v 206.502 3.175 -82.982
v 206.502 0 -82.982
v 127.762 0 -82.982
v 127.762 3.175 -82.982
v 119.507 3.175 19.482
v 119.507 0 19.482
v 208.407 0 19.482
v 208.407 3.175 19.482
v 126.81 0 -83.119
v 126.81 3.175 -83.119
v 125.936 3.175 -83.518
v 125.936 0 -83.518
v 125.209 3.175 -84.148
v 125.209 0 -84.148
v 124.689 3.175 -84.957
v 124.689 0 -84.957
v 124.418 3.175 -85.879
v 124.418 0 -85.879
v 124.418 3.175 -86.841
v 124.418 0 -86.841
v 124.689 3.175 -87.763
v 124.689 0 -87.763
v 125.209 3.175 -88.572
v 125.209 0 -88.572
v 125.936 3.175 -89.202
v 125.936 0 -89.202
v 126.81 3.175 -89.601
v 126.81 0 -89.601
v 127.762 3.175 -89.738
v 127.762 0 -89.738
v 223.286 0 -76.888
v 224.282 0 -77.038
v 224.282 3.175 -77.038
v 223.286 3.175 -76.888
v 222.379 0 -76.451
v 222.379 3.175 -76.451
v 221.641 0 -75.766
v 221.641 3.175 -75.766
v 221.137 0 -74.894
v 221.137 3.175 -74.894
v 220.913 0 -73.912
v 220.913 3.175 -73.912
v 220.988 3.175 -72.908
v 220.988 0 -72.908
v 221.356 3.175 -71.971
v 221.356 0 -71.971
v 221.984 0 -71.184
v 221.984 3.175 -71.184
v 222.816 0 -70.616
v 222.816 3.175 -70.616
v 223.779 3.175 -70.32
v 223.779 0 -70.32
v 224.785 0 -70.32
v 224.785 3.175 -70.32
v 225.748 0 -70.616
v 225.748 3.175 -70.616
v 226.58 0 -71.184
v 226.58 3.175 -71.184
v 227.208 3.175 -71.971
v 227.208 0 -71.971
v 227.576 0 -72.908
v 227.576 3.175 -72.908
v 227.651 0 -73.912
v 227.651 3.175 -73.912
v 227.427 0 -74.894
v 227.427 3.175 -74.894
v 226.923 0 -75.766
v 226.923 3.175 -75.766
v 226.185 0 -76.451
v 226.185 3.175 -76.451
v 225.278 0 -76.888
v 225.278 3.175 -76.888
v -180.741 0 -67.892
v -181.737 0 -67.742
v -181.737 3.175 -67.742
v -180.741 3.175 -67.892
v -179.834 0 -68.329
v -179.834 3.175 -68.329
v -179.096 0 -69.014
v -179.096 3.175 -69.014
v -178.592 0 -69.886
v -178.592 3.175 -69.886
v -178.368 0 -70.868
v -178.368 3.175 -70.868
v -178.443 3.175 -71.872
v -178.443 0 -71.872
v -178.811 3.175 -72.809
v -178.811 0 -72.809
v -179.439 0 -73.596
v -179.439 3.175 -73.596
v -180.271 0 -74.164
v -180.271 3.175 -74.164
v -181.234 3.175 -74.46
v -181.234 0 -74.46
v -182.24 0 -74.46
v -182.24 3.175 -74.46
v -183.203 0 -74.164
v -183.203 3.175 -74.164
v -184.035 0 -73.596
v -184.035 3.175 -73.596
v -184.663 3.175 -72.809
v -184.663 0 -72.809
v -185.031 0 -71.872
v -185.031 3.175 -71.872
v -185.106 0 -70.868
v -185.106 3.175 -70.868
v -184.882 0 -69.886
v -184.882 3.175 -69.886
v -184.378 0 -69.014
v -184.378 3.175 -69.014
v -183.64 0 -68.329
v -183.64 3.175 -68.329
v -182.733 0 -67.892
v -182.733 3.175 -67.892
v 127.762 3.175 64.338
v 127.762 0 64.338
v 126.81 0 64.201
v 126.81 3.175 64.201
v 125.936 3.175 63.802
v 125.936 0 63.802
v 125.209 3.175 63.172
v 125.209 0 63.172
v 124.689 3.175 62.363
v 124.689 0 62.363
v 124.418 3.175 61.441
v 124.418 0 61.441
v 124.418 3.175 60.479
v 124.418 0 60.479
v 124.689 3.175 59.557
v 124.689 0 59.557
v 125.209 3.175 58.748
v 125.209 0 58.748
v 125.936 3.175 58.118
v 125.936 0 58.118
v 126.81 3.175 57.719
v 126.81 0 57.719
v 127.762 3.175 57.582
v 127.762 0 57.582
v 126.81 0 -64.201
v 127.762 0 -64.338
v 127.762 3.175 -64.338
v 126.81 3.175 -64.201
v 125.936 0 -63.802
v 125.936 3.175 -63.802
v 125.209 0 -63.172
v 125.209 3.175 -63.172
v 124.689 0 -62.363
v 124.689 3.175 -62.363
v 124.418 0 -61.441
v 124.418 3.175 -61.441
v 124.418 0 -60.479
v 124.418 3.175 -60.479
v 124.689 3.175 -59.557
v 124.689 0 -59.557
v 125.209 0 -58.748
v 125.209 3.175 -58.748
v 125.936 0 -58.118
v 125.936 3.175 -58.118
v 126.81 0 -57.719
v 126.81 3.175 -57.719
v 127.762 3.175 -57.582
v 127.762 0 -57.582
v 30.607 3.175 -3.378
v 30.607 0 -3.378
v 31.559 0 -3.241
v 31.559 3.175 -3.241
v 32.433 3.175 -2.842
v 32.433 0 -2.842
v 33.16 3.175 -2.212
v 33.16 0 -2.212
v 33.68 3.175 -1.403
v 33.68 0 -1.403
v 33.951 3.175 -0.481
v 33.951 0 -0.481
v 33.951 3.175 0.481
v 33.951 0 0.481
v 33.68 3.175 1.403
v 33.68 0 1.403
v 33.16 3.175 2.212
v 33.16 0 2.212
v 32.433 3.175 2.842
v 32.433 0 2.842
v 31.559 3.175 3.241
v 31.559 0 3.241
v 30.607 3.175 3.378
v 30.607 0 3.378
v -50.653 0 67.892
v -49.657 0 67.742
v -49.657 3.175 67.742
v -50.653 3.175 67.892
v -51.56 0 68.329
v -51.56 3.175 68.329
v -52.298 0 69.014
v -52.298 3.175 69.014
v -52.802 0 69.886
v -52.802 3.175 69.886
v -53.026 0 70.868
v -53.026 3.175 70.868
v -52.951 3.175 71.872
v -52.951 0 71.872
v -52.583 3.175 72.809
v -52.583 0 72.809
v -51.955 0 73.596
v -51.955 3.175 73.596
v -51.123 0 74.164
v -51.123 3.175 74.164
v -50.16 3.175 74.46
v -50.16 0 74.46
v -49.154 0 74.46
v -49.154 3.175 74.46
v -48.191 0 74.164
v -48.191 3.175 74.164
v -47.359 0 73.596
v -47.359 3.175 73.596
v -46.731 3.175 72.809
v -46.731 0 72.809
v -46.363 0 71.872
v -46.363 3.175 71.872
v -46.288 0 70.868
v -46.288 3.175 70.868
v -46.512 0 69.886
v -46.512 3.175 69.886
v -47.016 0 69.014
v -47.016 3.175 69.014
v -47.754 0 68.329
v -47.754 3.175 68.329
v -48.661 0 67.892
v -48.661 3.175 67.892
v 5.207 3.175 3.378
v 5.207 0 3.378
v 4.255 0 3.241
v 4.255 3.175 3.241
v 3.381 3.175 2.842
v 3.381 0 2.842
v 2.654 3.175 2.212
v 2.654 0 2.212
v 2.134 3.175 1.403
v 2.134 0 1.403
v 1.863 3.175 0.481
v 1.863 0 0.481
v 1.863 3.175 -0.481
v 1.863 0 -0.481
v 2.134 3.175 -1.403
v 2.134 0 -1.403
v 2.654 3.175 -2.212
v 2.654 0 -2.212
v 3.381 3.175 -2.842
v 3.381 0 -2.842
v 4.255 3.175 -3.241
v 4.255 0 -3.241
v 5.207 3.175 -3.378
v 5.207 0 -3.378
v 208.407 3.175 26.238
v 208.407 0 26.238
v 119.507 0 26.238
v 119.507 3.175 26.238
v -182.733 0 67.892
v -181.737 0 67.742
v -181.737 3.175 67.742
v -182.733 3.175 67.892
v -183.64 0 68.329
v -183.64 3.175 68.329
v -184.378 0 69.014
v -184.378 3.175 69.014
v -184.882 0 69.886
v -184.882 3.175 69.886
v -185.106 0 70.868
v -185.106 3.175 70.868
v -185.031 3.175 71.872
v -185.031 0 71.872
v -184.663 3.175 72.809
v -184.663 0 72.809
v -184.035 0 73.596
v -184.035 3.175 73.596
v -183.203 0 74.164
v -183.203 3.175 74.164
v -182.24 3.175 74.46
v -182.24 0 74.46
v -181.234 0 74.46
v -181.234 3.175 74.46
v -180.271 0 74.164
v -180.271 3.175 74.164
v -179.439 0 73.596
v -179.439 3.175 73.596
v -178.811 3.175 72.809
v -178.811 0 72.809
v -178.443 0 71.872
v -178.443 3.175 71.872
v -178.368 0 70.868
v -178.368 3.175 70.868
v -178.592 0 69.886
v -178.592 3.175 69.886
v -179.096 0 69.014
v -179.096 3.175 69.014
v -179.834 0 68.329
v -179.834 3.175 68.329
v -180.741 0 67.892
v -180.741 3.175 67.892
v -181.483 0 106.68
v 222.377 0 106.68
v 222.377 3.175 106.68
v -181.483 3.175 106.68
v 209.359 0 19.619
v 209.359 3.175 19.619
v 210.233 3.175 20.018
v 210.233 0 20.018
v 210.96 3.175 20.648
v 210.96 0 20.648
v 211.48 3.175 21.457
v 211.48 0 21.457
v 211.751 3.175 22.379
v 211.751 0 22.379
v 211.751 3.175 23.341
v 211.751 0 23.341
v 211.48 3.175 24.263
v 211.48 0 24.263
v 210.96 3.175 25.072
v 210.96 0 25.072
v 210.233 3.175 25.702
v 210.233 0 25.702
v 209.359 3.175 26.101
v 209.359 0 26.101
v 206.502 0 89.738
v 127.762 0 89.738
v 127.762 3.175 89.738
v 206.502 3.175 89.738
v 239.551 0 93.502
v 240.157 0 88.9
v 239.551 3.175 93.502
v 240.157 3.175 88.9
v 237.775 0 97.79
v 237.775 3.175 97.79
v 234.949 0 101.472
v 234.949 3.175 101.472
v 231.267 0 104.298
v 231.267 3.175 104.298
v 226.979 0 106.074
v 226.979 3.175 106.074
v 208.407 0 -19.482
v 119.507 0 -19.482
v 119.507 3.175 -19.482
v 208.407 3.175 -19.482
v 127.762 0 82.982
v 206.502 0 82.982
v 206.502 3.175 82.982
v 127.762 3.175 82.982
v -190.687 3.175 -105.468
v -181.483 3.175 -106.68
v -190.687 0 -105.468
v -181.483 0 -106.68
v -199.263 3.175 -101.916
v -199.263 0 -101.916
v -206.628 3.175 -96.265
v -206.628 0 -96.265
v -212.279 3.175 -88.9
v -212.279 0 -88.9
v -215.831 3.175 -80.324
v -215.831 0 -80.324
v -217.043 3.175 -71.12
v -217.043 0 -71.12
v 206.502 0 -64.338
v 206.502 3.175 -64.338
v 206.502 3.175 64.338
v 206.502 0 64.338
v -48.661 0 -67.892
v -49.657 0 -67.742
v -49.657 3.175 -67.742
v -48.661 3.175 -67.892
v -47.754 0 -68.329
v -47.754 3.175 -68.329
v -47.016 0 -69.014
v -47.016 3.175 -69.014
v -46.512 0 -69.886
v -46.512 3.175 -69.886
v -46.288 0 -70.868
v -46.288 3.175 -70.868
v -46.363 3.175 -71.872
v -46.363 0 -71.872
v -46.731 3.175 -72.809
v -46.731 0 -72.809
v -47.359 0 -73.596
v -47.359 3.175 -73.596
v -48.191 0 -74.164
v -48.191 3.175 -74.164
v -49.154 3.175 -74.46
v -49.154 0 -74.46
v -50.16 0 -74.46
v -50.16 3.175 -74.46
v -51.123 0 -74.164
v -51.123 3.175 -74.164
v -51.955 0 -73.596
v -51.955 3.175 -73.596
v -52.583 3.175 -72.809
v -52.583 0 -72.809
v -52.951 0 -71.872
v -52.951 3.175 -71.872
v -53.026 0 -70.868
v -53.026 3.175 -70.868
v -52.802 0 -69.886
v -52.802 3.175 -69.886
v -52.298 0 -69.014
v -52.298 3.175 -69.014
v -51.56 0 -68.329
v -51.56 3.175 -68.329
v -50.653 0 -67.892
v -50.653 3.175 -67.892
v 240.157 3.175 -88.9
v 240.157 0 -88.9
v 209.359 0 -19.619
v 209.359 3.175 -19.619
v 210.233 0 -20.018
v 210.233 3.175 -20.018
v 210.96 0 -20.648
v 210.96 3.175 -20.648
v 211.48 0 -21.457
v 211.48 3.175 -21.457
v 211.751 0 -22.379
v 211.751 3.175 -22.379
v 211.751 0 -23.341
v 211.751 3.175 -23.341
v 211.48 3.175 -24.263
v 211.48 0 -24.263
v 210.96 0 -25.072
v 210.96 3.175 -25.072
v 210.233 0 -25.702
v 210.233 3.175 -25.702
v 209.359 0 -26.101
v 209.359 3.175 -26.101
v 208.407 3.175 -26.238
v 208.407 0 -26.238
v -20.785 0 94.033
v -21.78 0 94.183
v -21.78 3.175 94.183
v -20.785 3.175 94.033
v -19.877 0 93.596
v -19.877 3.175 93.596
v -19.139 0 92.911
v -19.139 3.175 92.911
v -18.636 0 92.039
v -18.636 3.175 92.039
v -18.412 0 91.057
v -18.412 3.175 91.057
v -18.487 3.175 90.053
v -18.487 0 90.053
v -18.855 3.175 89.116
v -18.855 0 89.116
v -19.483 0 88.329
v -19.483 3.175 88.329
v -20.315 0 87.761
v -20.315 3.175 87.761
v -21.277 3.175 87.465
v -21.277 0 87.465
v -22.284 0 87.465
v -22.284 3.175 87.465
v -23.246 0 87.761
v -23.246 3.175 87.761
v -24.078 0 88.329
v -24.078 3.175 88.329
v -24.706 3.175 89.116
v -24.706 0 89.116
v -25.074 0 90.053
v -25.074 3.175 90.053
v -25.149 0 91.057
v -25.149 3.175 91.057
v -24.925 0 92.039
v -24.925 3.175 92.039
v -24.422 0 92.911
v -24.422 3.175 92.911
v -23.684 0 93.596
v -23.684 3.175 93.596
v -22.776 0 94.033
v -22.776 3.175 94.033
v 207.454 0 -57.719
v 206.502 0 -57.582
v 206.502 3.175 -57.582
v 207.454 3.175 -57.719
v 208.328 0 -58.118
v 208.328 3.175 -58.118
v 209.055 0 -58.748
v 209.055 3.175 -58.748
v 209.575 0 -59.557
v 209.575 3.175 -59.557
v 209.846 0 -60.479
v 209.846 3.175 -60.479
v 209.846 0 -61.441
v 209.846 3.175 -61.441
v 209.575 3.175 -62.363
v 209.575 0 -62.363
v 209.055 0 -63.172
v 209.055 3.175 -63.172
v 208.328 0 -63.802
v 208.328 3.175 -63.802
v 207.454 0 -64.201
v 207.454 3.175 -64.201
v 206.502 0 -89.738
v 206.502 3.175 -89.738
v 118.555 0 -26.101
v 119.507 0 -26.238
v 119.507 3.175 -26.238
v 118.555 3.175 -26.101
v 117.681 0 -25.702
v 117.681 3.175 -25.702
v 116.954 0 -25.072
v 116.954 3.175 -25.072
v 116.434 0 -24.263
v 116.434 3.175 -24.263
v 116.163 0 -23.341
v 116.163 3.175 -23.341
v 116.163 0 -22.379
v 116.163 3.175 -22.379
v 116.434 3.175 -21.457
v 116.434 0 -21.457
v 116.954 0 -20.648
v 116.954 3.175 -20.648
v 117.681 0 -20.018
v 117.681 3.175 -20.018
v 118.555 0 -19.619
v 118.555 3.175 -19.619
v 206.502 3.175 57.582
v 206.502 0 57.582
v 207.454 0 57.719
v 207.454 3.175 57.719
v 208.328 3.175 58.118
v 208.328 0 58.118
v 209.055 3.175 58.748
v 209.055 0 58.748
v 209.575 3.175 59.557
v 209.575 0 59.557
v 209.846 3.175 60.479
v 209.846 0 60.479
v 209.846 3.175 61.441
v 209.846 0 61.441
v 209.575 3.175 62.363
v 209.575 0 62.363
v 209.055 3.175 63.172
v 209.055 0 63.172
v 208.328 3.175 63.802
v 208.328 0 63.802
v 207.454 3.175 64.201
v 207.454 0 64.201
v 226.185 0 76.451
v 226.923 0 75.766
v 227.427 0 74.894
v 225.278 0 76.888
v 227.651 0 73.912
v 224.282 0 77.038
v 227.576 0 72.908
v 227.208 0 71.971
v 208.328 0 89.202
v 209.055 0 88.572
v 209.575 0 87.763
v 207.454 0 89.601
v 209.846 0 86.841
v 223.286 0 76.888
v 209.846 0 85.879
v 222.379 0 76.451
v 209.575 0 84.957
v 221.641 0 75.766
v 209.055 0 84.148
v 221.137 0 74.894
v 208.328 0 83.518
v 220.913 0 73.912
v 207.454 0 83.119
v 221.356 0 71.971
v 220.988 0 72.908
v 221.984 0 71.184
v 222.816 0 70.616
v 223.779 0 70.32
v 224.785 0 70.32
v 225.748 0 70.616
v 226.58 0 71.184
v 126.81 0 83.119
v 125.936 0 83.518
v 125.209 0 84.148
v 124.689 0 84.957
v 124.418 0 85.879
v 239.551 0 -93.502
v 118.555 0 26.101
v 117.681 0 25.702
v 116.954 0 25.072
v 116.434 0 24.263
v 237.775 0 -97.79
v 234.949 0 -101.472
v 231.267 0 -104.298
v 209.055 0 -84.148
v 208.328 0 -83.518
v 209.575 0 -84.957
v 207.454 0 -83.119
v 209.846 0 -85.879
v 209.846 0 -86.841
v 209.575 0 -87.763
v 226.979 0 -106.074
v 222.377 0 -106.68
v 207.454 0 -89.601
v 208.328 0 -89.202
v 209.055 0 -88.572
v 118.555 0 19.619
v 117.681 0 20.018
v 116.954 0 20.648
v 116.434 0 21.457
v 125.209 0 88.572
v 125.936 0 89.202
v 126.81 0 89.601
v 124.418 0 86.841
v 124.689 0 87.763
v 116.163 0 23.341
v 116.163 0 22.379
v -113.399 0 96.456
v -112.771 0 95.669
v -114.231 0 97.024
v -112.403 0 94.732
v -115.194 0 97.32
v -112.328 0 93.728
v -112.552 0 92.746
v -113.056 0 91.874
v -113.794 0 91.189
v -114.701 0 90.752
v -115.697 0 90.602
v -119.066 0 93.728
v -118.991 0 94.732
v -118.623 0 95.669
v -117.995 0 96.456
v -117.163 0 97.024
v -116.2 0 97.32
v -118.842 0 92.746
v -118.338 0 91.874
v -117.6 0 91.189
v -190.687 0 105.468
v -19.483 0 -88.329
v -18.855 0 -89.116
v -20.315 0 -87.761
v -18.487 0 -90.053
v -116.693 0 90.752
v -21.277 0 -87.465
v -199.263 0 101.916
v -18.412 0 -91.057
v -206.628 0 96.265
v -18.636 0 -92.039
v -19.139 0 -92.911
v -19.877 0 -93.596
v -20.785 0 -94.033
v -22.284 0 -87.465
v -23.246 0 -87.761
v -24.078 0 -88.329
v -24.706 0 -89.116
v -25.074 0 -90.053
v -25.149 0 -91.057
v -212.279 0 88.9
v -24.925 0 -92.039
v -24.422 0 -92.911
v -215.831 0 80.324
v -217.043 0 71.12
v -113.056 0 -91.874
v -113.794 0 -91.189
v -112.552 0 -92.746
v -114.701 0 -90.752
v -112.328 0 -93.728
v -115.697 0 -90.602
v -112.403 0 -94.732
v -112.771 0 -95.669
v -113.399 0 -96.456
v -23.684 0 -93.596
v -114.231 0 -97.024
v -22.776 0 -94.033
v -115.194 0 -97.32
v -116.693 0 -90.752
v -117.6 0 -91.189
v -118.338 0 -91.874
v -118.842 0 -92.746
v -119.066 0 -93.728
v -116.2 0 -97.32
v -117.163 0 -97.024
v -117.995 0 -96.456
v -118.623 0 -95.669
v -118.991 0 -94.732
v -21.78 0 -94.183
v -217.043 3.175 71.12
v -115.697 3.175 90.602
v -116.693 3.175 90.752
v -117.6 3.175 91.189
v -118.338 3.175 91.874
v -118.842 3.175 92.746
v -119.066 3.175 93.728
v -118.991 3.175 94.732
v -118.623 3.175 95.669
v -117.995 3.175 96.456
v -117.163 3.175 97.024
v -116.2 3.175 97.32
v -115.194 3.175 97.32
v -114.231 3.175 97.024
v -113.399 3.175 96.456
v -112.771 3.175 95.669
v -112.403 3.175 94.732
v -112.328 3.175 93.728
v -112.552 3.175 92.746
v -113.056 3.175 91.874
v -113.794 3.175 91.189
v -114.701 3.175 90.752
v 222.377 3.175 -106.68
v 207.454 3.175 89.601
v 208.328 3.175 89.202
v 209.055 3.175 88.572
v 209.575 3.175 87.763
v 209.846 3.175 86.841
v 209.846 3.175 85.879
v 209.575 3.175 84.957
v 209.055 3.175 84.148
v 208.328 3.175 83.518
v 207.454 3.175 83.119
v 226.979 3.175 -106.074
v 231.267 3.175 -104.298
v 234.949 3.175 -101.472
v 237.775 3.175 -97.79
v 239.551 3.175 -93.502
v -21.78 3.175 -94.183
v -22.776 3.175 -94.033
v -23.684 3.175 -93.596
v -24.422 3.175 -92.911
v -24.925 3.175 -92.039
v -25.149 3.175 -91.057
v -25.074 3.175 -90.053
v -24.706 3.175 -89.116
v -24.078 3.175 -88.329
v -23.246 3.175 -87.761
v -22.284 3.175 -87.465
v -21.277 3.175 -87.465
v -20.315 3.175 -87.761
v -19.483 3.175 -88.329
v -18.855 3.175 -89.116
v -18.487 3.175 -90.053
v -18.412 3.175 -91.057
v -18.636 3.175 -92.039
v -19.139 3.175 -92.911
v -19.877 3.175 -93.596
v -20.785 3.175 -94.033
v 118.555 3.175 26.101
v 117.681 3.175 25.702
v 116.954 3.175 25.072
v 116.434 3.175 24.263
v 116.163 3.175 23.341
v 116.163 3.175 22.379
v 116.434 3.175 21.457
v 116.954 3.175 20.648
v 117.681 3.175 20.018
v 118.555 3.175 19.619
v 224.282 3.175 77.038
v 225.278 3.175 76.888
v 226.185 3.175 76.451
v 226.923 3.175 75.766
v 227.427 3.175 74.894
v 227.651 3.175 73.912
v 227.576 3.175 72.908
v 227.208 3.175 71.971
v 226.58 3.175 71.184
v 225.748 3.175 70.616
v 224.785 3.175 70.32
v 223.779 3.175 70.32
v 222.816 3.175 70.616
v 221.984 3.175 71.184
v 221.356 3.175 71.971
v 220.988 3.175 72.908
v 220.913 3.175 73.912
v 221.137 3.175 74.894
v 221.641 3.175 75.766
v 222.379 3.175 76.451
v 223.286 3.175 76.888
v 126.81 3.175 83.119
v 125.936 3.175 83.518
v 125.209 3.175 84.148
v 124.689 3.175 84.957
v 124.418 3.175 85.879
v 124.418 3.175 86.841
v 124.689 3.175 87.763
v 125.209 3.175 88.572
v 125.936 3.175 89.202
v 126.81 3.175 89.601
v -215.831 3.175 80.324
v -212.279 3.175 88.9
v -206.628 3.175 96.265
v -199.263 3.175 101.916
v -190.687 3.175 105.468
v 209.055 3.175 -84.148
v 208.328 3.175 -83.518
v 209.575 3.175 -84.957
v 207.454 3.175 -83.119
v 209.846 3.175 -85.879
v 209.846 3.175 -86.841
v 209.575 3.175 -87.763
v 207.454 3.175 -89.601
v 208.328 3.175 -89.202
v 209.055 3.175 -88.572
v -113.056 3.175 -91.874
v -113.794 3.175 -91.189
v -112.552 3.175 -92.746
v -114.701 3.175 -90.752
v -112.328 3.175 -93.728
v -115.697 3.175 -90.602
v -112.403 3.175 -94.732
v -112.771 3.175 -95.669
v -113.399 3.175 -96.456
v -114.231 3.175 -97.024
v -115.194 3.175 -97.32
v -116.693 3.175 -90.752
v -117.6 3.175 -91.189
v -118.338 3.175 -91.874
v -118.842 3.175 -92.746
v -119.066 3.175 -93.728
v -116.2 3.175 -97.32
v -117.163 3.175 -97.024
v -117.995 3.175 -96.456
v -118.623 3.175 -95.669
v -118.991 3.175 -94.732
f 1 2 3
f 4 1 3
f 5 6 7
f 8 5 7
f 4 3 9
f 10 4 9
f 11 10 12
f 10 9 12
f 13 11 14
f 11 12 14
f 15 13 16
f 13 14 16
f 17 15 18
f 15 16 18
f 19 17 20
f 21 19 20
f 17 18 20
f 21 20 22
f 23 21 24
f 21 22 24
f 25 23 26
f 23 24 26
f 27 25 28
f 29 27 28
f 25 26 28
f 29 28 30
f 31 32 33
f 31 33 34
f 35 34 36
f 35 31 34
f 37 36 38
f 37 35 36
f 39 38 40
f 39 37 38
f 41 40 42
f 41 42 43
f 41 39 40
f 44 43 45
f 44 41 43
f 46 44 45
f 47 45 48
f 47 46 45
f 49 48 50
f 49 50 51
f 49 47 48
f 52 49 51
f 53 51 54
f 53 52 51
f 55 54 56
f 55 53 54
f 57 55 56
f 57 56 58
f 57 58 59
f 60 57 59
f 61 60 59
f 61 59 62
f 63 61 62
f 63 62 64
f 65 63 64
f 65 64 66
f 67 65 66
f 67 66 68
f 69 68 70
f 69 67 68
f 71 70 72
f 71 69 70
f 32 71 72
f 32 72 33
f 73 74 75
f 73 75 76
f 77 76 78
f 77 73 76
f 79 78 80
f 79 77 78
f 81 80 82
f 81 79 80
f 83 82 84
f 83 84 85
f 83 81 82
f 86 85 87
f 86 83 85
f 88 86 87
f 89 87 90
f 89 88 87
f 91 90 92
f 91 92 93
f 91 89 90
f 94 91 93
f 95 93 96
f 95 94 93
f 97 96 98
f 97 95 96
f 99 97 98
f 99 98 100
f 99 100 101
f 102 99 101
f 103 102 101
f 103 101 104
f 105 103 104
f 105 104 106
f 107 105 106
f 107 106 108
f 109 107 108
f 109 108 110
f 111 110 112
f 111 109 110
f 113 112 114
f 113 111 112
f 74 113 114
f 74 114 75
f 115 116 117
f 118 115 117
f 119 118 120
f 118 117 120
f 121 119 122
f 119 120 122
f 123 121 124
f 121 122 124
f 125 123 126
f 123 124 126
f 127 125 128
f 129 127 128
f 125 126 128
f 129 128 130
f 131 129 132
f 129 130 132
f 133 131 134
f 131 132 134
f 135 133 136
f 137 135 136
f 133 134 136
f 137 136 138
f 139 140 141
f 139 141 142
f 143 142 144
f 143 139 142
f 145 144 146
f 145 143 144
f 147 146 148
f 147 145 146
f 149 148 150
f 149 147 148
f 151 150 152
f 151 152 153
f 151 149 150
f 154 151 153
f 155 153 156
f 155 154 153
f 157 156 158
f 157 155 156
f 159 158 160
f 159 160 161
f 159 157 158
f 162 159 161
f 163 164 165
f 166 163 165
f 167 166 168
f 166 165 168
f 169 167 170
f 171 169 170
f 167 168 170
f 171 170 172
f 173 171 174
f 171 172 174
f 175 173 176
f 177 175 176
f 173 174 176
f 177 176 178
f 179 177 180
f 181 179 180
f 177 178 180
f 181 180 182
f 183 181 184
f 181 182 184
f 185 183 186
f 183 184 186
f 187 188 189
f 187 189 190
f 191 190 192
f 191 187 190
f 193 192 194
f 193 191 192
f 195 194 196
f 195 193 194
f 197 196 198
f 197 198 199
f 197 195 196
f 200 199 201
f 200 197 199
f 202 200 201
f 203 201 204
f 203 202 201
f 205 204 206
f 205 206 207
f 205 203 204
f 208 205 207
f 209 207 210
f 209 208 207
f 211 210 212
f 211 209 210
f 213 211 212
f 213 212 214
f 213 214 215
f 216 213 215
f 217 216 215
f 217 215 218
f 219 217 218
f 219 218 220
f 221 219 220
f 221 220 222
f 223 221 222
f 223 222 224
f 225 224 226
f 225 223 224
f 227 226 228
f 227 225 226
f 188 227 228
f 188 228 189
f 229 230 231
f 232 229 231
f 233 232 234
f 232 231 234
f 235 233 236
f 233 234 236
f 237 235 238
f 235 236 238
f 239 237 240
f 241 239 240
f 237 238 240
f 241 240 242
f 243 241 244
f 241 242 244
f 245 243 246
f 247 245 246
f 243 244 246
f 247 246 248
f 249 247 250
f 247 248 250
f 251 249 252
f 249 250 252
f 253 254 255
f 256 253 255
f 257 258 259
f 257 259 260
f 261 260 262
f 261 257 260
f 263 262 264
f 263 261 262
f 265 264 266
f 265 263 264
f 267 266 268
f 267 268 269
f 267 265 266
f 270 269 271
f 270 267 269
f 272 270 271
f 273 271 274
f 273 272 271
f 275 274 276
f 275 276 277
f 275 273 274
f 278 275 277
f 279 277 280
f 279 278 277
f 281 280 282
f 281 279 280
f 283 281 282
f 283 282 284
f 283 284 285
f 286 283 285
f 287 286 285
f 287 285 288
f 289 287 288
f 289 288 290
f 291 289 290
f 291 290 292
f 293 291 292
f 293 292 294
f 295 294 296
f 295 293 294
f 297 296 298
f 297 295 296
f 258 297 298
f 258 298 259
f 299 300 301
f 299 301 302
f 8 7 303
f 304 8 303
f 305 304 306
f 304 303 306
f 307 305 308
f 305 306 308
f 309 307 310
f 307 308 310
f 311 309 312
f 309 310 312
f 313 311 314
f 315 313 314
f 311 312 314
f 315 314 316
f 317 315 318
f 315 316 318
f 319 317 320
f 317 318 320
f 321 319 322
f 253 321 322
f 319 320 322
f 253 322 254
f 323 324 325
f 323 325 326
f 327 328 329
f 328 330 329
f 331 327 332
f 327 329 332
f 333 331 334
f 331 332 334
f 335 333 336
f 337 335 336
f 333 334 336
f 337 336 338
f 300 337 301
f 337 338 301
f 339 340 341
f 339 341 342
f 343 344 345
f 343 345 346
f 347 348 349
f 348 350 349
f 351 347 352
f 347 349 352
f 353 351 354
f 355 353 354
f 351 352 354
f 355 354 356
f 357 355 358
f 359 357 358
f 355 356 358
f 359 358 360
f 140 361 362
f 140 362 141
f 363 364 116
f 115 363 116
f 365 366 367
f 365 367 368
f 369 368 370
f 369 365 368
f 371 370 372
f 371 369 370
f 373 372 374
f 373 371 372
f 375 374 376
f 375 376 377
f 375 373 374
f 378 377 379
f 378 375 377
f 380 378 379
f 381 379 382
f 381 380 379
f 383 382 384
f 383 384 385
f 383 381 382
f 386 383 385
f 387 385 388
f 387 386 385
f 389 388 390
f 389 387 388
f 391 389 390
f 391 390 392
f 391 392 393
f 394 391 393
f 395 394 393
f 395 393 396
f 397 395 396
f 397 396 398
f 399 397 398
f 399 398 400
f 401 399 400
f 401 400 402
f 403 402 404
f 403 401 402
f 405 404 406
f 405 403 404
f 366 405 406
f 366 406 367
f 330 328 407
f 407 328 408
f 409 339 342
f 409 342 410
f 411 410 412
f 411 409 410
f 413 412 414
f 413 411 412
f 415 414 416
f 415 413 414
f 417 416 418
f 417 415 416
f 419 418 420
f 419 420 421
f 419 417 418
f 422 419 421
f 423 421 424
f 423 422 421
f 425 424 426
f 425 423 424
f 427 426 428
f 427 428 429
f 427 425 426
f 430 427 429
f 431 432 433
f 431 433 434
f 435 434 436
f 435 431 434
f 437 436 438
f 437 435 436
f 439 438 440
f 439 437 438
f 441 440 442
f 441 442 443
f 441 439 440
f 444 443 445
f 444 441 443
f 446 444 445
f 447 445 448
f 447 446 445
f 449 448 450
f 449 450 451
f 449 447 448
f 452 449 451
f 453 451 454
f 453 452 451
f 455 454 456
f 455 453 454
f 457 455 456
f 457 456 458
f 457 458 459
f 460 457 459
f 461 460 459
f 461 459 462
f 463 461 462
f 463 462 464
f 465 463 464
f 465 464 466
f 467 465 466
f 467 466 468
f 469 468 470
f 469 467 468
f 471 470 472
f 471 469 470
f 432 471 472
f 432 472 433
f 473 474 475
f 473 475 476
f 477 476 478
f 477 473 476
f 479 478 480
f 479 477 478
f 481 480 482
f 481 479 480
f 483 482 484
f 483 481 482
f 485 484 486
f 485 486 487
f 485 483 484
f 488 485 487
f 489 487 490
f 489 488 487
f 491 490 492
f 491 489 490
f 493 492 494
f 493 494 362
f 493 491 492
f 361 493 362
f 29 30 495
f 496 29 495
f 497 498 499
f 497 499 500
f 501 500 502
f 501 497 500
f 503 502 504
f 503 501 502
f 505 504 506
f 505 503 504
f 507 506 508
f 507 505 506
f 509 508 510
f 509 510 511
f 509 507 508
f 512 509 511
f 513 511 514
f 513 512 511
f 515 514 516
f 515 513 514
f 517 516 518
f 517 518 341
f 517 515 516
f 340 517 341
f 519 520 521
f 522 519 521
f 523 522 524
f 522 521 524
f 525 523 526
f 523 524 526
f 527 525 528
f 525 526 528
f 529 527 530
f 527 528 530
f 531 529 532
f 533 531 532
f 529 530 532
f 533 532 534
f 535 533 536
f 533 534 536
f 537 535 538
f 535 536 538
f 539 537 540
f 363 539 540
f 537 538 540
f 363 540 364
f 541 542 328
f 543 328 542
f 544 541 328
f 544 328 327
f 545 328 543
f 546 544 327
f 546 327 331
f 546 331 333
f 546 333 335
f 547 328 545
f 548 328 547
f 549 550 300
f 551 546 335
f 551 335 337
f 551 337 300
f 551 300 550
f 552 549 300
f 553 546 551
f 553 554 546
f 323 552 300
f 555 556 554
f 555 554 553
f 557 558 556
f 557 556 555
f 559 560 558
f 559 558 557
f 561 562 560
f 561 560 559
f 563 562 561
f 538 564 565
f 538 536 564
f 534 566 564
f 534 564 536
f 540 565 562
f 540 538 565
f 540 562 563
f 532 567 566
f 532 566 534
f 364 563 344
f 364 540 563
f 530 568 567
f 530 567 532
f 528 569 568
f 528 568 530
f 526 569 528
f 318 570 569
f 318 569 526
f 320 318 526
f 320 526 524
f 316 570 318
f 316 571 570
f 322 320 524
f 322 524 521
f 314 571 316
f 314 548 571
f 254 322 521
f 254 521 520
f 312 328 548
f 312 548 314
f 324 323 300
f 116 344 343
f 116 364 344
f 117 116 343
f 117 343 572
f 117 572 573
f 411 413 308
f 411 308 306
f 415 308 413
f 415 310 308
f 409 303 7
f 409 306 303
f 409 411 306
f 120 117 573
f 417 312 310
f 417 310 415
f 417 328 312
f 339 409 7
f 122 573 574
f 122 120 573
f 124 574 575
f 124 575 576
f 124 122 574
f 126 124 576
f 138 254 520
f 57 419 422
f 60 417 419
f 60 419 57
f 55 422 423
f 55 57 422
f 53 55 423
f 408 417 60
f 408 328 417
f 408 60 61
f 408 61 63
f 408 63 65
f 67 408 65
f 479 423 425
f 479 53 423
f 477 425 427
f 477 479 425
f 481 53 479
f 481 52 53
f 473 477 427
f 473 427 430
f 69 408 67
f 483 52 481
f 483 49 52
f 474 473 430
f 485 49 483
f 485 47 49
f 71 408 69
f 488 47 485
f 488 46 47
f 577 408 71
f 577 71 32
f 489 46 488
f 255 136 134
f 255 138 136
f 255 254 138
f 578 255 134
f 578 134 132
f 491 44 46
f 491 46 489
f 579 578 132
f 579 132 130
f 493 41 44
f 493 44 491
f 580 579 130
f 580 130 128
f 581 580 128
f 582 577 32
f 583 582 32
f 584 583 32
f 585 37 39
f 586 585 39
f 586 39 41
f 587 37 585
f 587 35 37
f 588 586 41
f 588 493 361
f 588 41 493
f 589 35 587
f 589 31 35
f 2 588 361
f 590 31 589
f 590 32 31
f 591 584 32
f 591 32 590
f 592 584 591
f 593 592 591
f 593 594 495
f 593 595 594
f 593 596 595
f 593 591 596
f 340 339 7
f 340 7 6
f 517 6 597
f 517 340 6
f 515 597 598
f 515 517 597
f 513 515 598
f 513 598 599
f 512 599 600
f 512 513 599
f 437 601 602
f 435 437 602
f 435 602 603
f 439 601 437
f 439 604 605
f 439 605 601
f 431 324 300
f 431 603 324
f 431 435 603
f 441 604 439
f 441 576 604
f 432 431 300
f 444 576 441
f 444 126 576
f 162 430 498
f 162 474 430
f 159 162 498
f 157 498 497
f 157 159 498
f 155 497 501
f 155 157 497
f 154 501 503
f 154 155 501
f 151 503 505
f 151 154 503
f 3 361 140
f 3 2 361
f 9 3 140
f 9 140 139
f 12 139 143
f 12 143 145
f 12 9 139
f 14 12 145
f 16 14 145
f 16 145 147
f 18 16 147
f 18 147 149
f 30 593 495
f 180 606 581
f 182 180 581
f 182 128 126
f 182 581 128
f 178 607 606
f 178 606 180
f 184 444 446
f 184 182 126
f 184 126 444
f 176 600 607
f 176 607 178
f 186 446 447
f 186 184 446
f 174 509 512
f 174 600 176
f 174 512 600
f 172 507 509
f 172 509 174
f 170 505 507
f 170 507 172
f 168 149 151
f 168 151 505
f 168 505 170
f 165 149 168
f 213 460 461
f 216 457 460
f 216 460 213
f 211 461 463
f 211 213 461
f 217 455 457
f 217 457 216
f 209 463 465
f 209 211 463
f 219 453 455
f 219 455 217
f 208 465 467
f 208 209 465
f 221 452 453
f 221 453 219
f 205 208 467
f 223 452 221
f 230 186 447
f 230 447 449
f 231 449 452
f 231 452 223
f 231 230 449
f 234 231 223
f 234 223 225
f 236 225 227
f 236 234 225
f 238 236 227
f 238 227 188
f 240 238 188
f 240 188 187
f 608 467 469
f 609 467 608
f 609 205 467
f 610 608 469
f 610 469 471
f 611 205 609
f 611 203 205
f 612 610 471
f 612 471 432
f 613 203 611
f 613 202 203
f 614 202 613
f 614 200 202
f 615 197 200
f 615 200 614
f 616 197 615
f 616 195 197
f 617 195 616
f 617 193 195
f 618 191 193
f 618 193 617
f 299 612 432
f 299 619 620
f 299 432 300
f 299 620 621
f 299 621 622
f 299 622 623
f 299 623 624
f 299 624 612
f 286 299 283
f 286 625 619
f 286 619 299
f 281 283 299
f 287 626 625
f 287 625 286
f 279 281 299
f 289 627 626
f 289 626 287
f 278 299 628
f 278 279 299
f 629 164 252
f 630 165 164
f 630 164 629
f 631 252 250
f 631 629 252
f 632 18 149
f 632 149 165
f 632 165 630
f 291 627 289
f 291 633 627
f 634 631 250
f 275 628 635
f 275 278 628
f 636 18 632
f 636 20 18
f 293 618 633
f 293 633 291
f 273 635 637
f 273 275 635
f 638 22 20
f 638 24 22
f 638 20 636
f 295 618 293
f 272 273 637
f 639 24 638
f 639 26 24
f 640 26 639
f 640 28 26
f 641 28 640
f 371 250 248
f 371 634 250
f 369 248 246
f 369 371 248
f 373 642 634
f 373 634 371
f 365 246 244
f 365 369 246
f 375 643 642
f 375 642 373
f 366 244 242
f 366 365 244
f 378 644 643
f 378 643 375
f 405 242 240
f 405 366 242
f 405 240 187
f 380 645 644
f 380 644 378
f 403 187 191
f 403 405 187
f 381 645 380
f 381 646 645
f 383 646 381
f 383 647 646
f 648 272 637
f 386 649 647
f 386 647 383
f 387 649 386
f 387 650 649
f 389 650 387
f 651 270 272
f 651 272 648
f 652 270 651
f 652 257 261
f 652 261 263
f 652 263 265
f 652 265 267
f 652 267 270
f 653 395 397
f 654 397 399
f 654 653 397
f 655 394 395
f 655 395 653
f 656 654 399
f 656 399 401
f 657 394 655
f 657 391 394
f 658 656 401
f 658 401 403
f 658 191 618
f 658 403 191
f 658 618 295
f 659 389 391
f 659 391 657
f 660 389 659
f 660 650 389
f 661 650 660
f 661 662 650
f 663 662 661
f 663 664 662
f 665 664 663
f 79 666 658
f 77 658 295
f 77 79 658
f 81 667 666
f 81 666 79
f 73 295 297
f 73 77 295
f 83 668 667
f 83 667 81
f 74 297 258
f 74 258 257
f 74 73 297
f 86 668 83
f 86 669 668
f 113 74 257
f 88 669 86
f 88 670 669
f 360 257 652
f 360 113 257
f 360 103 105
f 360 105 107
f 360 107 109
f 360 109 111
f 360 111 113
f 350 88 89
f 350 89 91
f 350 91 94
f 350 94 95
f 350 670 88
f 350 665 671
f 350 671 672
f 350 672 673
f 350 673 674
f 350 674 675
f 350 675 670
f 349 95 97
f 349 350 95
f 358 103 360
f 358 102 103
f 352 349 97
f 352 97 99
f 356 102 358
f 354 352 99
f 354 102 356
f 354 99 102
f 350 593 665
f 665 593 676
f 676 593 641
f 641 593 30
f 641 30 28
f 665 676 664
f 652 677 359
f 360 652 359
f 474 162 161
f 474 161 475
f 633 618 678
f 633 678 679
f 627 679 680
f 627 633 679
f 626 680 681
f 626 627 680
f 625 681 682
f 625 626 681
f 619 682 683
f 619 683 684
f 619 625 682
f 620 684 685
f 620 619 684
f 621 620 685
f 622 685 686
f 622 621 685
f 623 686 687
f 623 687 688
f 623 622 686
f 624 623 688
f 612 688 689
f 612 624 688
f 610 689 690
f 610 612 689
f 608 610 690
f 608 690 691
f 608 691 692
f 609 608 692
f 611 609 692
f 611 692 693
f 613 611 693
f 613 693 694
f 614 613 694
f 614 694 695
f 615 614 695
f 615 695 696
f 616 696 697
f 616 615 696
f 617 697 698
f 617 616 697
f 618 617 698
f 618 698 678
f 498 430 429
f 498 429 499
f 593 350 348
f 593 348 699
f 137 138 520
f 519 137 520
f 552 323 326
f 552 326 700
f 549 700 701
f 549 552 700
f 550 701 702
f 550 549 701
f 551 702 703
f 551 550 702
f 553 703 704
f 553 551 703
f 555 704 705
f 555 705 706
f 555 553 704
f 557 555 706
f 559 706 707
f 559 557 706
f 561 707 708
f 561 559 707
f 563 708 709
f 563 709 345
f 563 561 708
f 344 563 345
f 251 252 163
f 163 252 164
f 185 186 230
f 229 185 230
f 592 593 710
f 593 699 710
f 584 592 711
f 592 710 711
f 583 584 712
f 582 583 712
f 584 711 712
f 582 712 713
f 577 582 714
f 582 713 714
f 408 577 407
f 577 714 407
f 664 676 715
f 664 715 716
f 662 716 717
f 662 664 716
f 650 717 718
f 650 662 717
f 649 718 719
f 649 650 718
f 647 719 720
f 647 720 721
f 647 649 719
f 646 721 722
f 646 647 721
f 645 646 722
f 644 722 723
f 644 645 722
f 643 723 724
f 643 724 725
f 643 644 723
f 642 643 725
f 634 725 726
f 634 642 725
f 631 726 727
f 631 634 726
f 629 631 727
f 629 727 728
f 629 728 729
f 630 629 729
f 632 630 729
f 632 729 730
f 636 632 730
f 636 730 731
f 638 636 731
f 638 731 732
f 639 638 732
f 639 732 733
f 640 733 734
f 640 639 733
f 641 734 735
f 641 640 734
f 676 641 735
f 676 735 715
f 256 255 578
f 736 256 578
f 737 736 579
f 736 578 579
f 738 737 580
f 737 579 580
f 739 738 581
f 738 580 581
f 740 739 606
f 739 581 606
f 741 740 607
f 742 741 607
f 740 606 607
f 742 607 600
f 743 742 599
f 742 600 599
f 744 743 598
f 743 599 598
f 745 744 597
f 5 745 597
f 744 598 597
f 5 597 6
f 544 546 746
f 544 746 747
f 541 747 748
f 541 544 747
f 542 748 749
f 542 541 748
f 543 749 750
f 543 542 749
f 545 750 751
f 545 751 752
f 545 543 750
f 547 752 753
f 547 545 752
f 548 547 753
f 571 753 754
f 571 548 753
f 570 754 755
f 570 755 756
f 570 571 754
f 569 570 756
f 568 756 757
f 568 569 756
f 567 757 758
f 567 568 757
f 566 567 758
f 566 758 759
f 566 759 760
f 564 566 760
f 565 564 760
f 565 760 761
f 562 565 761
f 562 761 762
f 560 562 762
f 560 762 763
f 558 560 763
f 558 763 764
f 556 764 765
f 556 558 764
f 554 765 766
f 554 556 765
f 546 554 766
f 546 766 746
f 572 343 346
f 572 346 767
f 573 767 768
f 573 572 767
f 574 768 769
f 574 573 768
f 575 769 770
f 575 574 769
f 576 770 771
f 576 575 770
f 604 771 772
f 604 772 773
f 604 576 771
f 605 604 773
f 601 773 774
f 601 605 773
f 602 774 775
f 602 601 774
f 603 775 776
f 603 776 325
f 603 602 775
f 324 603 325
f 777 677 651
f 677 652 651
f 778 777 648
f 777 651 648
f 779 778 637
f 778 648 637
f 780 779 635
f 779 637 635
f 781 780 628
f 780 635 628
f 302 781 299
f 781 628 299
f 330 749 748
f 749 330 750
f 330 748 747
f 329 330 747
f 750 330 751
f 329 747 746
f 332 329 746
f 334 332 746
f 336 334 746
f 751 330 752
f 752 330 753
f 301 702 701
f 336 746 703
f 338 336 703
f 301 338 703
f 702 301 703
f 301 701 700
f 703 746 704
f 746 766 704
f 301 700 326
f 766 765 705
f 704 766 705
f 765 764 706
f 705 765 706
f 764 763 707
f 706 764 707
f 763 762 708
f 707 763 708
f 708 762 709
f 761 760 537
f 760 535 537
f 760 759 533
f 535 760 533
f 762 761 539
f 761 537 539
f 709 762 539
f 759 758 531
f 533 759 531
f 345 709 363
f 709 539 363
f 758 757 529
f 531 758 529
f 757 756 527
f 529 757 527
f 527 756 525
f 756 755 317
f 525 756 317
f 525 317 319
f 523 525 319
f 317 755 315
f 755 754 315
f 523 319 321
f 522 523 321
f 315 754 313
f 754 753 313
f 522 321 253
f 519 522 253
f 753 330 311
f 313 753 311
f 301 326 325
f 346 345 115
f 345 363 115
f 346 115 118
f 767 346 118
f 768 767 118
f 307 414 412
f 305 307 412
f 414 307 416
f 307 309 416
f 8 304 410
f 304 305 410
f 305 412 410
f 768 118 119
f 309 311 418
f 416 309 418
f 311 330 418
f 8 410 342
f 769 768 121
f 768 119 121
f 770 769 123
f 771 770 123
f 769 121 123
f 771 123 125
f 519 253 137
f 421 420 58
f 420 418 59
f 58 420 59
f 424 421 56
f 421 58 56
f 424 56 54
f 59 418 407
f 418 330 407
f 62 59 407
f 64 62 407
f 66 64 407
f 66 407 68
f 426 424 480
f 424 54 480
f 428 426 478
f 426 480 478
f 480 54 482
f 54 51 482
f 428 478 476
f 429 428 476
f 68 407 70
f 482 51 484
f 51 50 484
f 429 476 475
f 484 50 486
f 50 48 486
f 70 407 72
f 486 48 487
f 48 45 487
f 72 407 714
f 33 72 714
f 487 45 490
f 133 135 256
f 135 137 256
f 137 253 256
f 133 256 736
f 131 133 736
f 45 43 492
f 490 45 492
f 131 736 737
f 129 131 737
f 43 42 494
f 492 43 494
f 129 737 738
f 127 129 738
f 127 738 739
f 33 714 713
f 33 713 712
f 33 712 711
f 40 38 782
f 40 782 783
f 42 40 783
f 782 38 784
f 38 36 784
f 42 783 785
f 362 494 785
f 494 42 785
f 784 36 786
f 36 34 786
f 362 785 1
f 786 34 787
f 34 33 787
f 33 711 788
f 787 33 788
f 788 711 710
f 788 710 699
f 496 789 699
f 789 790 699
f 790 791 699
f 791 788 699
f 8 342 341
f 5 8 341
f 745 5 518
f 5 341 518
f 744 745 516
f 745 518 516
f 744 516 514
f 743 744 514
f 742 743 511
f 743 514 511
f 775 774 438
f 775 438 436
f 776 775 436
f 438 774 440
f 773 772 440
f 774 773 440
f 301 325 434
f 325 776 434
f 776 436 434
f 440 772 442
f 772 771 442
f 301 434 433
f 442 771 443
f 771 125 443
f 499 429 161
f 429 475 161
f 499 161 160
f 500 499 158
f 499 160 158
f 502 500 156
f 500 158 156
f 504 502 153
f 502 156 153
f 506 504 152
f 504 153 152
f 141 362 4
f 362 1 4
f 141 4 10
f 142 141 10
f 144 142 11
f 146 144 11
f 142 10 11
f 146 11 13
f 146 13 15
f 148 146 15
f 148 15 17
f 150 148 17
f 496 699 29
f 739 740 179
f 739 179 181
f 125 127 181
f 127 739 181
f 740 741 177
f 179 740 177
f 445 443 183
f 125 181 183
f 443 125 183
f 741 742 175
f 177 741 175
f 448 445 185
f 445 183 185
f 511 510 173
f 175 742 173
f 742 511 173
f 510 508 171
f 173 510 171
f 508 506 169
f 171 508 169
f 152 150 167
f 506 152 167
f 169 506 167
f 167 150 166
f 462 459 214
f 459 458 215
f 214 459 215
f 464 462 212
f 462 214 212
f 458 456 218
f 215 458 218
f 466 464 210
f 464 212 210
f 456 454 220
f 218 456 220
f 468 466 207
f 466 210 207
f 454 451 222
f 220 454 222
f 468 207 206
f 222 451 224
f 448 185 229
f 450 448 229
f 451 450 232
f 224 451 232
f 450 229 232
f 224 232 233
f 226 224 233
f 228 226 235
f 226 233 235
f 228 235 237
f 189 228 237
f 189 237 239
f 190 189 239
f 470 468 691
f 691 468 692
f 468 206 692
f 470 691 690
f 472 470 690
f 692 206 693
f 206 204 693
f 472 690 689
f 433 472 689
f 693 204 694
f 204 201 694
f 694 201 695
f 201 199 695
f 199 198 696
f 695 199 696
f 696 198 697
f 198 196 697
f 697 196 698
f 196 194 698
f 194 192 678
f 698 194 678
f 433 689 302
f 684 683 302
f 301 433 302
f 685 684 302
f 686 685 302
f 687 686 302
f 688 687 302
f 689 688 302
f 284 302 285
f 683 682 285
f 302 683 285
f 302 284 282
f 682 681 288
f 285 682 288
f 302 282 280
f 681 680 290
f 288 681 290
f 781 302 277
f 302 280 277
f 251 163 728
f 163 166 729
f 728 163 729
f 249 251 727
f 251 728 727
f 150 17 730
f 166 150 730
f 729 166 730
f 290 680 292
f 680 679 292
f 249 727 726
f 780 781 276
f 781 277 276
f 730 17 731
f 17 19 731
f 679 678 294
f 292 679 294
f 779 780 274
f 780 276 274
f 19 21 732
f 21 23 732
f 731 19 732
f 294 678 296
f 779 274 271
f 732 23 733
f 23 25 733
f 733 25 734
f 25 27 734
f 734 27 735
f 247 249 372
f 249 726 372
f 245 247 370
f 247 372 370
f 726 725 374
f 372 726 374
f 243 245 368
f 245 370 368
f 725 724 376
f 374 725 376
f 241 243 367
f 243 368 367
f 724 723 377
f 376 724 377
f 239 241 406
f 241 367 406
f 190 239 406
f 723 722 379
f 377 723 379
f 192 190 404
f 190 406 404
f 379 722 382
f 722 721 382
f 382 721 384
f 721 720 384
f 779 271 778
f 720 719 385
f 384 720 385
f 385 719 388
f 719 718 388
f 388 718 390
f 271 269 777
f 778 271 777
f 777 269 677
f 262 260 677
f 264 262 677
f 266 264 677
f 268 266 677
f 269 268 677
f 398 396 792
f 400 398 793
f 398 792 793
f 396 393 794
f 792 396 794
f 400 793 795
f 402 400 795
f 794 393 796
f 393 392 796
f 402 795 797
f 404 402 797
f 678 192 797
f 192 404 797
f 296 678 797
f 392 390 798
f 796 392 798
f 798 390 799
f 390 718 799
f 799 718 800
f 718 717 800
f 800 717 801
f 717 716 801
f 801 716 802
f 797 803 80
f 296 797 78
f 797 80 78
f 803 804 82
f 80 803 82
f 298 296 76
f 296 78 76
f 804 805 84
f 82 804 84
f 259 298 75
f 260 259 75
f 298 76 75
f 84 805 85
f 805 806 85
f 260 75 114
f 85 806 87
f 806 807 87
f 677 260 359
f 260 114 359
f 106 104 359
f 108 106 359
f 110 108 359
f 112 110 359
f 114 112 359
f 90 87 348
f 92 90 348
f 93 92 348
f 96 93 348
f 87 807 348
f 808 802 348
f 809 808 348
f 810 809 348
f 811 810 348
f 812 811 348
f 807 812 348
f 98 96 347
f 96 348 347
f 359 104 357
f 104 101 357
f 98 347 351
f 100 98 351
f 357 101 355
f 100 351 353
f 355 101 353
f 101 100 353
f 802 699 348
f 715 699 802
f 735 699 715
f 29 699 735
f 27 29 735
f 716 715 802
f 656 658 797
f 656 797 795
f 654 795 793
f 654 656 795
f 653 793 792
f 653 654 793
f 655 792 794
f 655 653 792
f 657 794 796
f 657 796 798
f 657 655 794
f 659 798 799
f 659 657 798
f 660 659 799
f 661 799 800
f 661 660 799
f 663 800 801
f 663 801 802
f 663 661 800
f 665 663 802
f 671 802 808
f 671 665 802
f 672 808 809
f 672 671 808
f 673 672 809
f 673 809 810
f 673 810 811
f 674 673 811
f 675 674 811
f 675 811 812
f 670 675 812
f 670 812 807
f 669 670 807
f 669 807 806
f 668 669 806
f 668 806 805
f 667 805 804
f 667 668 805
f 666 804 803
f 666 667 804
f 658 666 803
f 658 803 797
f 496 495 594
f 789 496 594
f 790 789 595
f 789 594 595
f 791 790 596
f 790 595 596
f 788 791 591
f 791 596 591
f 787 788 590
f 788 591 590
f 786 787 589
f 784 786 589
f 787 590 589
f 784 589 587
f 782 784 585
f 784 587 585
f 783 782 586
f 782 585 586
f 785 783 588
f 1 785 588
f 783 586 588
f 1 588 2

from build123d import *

# Parameters (mm, degrees)
SKETCH1_R           = 3.3782
BOSS_EXTRUDE1_DEPTH = 3.175
SKETCH4_W           = 23.114
SKETCH4_H           = 213.36
CUT_EXTRUDE1_DEPTH  = 263.804276362
FILLET1_R           = 17.78
FILLET2_R           = 35.56


with BuildPart() as part:
    # Sketch1 → Boss-Extrude1 (new body)
    with BuildSketch(Plane(origin=(0, 0, 0), x_dir=(1, 0, 0), z_dir=(0, 1, 0))):
        Polygon((-240.157, 106.68), (240.157, 106.68), (240.157, -73.66), (240.157, -106.68), (-240.157, -106.68), align=None)
        with Locations(Location((224.282, -73.66, 0), (0, 0, 270))):
            Circle(SKETCH1_R, mode=Mode.SUBTRACT)
        with Locations(Location((-21.7805, -90.805, 0), (0, 0, 270))):
            Circle(SKETCH1_R, mode=Mode.SUBTRACT)
        with Locations(Location((-21.7805, 90.805, 0), (0, 0, 90))):
            Circle(SKETCH1_R, mode=Mode.SUBTRACT)
        with Locations(Location((224.282, 73.66, 0), (0, 0, 90))):
            Circle(SKETCH1_R, mode=Mode.SUBTRACT)
        with Locations(Location((-115.697, 93.98, 0), (0, 0, 270))):
            Circle(SKETCH1_R, mode=Mode.SUBTRACT)
        with Locations(Location((-115.697, -93.98, 0), (0, 0, 90))):
            Circle(SKETCH1_R, mode=Mode.SUBTRACT)
        with Locations(Location((-181.737, 71.12, 0), (0, 0, 270))):
            Circle(SKETCH1_R, mode=Mode.SUBTRACT)
        with Locations(Location((-49.657, 71.12, 0), (0, 0, 270))):
            Circle(SKETCH1_R, mode=Mode.SUBTRACT)
        with Locations(Location((-49.657, -71.12, 0), (0, 0, 90))):
            Circle(SKETCH1_R, mode=Mode.SUBTRACT)
        with Locations(Location((-181.737, -71.12, 0), (0, 0, 90))):
            Circle(SKETCH1_R, mode=Mode.SUBTRACT)
        with BuildLine():
            Line((119.507, -19.4818), (208.407, -19.4818))
            ThreePointArc((208.407, -19.4818), (211.7852, -22.86), (208.407, -26.2382))
            Line((208.407, -26.2382), (119.507, -26.2382))
            ThreePointArc((119.507, -26.2382), (116.1288, -22.86), (119.507, -19.4818))
        make_face(mode=Mode.SUBTRACT)
        with BuildLine():
            Line((119.507, 19.4818), (208.407, 19.4818))
            ThreePointArc((208.407, 19.4818), (211.7852, 22.86), (208.407, 26.2382))
            Line((208.407, 26.2382), (119.507, 26.2382))
            ThreePointArc((119.507, 26.2382), (116.1288, 22.86), (119.507, 19.4818))
        make_face(mode=Mode.SUBTRACT)
        with BuildLine():
            Line((127.762, -57.5818), (206.502, -57.5818))
            ThreePointArc((206.502, -57.5818), (209.8802, -60.96), (206.502, -64.3382))
            Line((206.502, -64.3382), (127.762, -64.3382))
            ThreePointArc((127.762, -64.3382), (124.3838, -60.96), (127.762, -57.5818))
        make_face(mode=Mode.SUBTRACT)
        with BuildLine():
            Line((127.762, -89.7382), (206.502, -89.7382))
            ThreePointArc((206.502, -89.7382), (209.8802, -86.36), (206.502, -82.9818))
            Line((206.502, -82.9818), (127.762, -82.9818))
            ThreePointArc((127.762, -82.9818), (124.3838, -86.36), (127.762, -89.7382))
        make_face(mode=Mode.SUBTRACT)
        with BuildLine():
            Line((127.762, 57.5818), (206.502, 57.5818))
            ThreePointArc((206.502, 57.5818), (209.8802, 60.96), (206.502, 64.3382))
            Line((206.502, 64.3382), (127.762, 64.3382))
            ThreePointArc((127.762, 64.3382), (124.3838, 60.96), (127.762, 57.5818))
        make_face(mode=Mode.SUBTRACT)
        with BuildLine():
            Line((127.762, 89.7382), (206.502, 89.7382))
            ThreePointArc((206.502, 89.7382), (209.8802, 86.36), (206.502, 82.9818))
            Line((206.502, 82.9818), (127.762, 82.9818))
            ThreePointArc((127.762, 82.9818), (124.3838, 86.36), (127.762, 89.7382))
        make_face(mode=Mode.SUBTRACT)
        with BuildLine():
            Line((5.207, 3.3782), (30.607, 3.3782))
            ThreePointArc((30.607, 3.3782), (33.9852, 0), (30.607, -3.3782))
            Line((30.607, -3.3782), (5.207, -3.3782))
            ThreePointArc((5.207, -3.3782), (1.8288, 0), (5.207, 3.3782))
        make_face(mode=Mode.SUBTRACT)
    extrude(amount=BOSS_EXTRUDE1_DEPTH)

    # Sketch4 → Cut-Extrude1 (cut, through all)
    with BuildSketch(Plane(origin=(0, 3.175, 0), x_dir=(1, 0, 0), z_dir=(0, 1, 0))):
        with Locations((-228.6, 0)):
            Rectangle(SKETCH4_W, SKETCH4_H)
    extrude(amount=-CUT_EXTRUDE1_DEPTH, mode=Mode.SUBTRACT)

    # Fillet1
    fillet1_edges = [part.edges().sort_by_distance(p)[0] for p in [
        (240.157, 1.5875, 106.68),
        (240.157, 1.5875, -106.68),
    ]]
    fillet(fillet1_edges, radius=FILLET1_R)

    # Fillet2
    fillet2_edges = [part.edges().sort_by_distance(p)[0] for p in [
        (-217.043, 1.5875, -106.68),
        (-217.043, 1.5875, 106.68),
    ]]
    fillet(fillet2_edges, radius=FILLET2_R)


solid = part.part
